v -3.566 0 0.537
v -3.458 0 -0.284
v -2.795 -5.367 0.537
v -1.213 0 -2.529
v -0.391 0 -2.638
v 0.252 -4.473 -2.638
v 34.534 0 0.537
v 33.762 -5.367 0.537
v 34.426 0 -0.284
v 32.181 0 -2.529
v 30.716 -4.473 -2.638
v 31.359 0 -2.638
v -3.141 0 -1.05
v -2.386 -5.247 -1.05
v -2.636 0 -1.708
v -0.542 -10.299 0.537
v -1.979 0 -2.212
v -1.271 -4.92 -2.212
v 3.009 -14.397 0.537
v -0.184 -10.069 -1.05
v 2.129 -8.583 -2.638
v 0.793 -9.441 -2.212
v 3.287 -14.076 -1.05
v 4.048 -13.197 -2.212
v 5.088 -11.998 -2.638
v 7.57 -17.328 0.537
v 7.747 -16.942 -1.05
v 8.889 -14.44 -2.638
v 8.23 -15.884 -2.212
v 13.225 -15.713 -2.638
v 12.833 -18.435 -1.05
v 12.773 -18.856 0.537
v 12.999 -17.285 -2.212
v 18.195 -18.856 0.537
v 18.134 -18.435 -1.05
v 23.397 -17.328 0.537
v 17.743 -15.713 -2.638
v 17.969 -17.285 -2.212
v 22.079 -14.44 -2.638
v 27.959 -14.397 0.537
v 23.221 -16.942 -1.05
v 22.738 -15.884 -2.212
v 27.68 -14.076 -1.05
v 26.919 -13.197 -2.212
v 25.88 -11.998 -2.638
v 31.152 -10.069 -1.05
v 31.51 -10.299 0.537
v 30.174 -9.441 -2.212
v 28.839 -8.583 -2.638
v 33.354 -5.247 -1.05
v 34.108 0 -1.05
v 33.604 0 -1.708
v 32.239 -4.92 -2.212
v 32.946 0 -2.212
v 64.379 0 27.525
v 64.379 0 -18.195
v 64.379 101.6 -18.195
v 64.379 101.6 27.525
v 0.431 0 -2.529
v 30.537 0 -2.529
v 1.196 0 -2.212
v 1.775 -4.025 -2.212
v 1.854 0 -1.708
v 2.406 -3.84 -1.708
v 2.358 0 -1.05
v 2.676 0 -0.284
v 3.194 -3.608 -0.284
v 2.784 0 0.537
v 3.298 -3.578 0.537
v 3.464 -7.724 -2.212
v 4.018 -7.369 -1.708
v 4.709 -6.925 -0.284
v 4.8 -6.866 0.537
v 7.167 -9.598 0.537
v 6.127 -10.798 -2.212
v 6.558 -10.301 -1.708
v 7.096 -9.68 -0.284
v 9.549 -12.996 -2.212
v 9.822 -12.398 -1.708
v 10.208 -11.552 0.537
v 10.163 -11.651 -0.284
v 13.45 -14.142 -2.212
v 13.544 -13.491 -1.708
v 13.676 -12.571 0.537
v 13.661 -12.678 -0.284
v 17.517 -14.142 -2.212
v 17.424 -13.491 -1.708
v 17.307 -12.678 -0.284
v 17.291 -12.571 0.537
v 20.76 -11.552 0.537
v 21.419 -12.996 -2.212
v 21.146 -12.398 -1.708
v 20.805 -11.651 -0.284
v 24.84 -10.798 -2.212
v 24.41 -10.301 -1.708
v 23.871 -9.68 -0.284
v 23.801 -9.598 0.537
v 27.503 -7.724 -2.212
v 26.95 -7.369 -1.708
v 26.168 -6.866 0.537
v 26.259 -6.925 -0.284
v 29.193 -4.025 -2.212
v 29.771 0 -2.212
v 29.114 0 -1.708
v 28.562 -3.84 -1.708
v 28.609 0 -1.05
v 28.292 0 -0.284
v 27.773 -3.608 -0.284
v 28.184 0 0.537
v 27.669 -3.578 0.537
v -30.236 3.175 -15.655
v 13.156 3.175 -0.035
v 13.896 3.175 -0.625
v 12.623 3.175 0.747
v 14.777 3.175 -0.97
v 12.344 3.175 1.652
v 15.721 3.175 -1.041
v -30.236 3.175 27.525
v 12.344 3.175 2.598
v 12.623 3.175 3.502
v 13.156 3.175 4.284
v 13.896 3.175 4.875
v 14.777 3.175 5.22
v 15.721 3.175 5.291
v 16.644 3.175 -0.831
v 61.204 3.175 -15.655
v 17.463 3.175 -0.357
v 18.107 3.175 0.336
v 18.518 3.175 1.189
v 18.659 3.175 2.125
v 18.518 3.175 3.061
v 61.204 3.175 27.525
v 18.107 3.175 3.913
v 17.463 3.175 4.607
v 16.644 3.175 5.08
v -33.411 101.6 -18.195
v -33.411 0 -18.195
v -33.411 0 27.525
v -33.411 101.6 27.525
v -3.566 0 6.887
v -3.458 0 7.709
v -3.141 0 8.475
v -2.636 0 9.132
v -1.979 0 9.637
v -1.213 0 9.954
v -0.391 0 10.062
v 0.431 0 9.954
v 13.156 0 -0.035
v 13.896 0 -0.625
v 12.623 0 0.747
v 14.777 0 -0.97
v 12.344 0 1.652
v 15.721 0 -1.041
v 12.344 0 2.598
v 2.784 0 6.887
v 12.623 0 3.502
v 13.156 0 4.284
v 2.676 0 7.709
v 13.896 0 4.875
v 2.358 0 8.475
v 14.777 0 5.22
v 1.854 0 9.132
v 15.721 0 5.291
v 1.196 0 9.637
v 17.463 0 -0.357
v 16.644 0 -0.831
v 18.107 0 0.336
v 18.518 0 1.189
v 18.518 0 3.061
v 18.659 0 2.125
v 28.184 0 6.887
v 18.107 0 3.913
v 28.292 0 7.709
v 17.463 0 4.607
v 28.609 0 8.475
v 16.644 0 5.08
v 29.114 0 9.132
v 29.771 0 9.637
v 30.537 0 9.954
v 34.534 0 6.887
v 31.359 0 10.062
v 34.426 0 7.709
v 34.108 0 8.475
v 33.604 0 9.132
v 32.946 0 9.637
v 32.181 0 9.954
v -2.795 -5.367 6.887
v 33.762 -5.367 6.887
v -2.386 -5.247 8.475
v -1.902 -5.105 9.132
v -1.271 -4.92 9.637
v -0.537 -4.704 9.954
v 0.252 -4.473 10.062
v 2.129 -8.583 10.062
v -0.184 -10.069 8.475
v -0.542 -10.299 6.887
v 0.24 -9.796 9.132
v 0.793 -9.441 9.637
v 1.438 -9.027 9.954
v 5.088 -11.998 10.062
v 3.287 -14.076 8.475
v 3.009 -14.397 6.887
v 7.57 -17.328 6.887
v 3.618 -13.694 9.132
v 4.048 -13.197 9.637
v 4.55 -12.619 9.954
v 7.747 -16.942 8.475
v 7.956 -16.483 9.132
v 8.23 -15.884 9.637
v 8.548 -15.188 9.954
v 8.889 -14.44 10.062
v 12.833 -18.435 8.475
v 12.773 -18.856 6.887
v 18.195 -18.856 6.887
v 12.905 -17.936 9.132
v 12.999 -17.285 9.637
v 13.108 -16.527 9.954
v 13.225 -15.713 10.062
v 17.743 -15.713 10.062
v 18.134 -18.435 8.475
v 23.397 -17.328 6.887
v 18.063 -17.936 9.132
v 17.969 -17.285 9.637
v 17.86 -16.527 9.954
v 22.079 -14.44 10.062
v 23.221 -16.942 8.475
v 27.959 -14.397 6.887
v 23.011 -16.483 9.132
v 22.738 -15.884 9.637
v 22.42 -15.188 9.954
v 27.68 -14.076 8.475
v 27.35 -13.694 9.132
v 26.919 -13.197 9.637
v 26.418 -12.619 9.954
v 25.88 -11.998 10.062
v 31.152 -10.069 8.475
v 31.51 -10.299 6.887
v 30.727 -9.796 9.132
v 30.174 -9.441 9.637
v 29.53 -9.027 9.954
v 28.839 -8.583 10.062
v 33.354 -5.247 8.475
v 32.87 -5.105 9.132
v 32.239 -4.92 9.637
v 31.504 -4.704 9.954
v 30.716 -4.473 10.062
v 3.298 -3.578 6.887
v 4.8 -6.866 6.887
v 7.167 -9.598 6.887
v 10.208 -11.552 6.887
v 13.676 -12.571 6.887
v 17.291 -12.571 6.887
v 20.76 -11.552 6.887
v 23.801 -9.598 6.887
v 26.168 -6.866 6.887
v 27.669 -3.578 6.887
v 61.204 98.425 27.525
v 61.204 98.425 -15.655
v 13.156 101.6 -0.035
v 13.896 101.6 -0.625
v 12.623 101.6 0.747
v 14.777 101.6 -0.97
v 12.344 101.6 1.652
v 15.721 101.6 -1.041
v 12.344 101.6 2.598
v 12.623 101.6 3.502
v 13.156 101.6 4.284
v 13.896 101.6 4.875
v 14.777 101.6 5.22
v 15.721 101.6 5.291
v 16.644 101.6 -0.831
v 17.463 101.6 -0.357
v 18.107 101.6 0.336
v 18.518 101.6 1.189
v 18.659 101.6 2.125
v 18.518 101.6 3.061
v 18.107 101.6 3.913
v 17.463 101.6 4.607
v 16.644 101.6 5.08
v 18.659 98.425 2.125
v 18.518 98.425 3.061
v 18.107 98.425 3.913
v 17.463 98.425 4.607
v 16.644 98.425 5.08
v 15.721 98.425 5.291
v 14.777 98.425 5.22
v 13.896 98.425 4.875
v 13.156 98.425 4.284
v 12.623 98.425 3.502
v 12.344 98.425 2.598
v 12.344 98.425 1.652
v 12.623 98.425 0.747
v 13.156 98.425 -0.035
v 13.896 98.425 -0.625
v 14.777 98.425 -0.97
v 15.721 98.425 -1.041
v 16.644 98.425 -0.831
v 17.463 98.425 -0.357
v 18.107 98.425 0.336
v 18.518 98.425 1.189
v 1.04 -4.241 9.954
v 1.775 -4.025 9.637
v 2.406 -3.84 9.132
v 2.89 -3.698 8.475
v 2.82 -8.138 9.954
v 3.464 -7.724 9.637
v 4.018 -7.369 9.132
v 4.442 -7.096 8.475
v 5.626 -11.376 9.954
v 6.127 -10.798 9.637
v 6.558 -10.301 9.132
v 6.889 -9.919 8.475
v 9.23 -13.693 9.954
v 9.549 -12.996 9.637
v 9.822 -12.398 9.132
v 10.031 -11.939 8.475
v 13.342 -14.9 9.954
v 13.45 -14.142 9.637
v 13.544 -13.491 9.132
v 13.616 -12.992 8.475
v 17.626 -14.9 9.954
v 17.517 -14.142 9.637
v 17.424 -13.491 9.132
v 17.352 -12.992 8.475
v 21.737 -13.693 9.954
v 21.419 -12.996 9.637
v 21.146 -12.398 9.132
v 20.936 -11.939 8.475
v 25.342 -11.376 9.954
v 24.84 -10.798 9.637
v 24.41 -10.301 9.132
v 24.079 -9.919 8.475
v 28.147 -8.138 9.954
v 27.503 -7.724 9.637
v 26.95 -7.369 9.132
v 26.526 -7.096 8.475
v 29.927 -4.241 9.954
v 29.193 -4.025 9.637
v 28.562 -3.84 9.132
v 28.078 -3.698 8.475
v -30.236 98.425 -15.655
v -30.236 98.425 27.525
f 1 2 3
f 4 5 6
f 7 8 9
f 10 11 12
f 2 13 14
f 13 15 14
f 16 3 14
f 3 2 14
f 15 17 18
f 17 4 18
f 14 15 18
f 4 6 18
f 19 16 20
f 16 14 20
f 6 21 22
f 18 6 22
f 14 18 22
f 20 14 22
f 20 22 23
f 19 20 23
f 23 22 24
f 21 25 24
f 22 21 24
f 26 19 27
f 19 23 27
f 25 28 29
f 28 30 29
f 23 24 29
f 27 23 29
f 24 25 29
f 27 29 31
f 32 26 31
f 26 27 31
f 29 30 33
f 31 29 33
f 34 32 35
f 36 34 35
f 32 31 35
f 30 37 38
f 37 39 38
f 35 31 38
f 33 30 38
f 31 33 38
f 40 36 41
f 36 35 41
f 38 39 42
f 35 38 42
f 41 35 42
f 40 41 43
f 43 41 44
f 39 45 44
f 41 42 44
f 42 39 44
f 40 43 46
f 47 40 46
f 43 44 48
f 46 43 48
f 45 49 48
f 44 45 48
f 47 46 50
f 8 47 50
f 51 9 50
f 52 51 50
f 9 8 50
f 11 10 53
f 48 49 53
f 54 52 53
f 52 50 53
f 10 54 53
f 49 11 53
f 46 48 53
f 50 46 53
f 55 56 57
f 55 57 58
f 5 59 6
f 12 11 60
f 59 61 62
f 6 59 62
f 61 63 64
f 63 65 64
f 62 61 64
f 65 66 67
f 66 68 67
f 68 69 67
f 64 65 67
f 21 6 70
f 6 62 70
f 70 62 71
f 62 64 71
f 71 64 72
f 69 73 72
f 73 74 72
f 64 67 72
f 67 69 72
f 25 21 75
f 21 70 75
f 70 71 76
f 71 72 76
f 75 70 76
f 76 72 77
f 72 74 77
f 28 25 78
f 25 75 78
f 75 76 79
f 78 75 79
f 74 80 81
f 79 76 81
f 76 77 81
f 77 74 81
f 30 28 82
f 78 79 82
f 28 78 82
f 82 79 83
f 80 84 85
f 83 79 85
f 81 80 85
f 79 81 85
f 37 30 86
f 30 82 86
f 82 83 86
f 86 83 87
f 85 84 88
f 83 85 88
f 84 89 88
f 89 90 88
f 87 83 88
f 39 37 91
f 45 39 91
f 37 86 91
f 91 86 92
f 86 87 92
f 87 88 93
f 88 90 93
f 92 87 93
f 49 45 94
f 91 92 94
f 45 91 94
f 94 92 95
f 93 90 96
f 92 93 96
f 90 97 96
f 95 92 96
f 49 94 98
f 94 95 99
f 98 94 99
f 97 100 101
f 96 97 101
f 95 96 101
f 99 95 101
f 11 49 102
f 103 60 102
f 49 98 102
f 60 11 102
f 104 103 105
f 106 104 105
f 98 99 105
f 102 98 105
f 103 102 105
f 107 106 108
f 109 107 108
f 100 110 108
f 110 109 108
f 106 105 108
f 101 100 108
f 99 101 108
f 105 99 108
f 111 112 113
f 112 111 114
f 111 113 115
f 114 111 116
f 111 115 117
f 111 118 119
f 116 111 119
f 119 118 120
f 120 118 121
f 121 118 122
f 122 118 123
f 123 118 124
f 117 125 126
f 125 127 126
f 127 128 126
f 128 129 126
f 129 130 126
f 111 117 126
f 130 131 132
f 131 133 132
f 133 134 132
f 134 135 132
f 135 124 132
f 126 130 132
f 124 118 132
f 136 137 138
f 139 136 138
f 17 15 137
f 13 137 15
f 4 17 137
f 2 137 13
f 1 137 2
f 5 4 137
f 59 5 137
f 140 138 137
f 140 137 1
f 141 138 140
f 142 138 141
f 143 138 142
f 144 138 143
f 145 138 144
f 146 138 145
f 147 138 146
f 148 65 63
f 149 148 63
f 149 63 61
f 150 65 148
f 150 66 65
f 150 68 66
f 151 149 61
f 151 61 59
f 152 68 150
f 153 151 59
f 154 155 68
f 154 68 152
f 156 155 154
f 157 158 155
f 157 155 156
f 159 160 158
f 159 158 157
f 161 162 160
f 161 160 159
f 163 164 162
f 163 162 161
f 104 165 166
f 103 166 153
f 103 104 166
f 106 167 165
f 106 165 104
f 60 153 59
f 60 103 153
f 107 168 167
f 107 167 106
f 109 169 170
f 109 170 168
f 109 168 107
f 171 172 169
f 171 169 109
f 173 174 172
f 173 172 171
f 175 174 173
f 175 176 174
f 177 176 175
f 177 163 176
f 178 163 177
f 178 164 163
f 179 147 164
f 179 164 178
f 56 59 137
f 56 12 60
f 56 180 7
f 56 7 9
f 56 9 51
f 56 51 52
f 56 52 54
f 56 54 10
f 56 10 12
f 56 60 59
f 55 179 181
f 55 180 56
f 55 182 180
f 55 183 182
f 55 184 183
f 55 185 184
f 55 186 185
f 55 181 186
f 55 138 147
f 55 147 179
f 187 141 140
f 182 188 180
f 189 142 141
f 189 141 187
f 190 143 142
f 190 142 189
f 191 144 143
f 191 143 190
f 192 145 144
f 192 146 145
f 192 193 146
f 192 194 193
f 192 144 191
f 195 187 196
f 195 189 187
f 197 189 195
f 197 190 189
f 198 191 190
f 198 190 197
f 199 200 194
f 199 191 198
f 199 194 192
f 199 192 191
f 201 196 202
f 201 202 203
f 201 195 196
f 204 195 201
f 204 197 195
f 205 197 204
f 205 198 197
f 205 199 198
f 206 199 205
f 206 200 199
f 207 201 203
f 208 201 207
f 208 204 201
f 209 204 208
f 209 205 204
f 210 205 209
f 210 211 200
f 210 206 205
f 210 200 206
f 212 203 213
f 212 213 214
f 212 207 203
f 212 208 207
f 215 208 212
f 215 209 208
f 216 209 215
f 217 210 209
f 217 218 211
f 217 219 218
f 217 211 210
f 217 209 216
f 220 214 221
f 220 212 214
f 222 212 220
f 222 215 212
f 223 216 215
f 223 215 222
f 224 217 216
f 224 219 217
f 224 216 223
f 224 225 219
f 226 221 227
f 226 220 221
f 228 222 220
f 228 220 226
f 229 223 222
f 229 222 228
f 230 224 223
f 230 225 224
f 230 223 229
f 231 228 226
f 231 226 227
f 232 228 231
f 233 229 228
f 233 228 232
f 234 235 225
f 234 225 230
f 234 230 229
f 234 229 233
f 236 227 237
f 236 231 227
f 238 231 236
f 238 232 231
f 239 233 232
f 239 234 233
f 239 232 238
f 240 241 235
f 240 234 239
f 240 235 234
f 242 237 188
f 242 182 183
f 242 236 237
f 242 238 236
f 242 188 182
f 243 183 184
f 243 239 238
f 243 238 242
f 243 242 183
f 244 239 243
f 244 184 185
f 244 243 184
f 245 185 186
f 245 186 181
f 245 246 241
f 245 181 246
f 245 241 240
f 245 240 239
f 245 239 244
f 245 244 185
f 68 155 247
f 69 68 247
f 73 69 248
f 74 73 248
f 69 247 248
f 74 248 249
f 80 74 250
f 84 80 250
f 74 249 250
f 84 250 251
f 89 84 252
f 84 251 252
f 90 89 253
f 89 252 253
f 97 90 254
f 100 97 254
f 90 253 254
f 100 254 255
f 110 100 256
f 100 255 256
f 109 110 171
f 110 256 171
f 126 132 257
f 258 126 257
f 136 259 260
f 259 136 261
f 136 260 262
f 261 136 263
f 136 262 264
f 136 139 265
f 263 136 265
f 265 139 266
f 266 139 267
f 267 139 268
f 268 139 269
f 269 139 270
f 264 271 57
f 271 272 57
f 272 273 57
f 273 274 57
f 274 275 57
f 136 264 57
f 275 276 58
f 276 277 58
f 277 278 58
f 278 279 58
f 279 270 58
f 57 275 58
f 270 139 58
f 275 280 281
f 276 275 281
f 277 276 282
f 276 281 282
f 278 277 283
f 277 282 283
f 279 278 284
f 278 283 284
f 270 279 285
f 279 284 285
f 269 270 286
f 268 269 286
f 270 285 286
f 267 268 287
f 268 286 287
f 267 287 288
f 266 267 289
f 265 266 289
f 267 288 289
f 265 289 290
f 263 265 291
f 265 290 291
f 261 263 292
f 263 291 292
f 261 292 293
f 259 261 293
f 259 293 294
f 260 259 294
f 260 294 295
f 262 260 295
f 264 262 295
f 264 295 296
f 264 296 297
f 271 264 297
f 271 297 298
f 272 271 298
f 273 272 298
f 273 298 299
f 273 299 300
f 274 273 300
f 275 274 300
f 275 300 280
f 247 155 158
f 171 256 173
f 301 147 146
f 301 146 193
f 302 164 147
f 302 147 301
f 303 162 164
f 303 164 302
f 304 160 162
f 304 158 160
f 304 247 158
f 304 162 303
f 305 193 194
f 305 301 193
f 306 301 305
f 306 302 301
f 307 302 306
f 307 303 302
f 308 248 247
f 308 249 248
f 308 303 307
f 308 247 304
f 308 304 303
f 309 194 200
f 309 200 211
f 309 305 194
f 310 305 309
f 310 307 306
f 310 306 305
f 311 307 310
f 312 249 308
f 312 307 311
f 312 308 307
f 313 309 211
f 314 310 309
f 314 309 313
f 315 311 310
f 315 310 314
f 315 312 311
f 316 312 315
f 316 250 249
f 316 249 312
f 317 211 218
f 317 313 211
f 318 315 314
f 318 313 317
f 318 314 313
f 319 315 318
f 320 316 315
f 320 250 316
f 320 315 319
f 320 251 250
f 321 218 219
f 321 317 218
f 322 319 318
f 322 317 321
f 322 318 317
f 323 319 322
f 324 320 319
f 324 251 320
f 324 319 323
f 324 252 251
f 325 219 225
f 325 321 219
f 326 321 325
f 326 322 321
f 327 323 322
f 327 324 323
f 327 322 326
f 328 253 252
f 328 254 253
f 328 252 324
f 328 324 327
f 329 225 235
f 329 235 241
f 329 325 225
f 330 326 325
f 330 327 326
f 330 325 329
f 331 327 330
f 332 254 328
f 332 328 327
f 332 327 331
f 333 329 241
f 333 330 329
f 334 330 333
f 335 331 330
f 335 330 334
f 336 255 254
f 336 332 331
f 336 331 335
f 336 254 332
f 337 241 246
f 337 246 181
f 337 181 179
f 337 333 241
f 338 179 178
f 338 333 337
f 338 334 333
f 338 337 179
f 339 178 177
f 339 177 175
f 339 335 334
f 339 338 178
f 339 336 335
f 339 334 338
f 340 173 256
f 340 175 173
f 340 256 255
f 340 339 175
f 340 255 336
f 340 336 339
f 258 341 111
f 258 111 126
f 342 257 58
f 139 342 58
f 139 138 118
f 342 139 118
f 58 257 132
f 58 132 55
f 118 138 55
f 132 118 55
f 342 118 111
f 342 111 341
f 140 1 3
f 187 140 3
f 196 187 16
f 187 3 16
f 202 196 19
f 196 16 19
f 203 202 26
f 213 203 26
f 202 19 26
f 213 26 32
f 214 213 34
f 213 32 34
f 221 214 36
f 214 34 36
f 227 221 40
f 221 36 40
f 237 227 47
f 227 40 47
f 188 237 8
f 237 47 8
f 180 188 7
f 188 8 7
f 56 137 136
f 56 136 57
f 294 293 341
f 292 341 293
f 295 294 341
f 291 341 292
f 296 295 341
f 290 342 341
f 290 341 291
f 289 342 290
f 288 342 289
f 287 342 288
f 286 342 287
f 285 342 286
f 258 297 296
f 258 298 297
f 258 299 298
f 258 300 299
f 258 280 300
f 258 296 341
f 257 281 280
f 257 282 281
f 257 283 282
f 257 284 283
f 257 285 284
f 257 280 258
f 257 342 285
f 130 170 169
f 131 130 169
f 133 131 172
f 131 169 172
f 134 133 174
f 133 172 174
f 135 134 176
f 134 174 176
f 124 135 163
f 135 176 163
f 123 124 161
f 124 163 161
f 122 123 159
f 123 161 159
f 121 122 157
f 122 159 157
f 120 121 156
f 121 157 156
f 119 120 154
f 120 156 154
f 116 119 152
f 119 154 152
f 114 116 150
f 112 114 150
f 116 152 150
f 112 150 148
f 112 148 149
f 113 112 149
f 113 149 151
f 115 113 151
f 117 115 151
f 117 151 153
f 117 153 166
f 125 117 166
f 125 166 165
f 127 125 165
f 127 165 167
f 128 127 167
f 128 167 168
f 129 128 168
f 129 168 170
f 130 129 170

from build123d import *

# Parameters (mm, degrees)
F0_W      = 97.79
F0_H      = 45.72
F1_DEPTH  = 101.6
F2_W      = 91.44
F2_H      = 95.25
F3_DEPTH  = 43.18
F4_W      = 19.05
F4_H      = 6.35
F5_ANGLE  = 180
F7_DEPTH  = 25.4
F8_R      = 3.17499
F10_D     = 6.35
F10_DEPTH = 101.601


# Not quite as in the source:
# - a fillet or chamfer is up to 0.001 mm smaller than in the source, because OpenCascade refuses the exact size


with BuildPart() as f1:
    # F0 (on Front) → F1 (new body)
    with BuildSketch(Plane.XZ):
        with Locations((15.4838143581, 4.6649015626)):
            Rectangle(F0_W, F0_H)
    extrude(amount=-F1_DEPTH)

    # F2 (on face) → F3 (cut)
    with BuildSketch(Plane.XY.offset(27.5249015626)):
        with Locations((15.4838143581, 50.8)):
            Rectangle(F2_W, F2_H)
    extrude(amount=-F3_DEPTH, mode=Mode.SUBTRACT)

    # F4 (on face) → F5 (revolve)
    with BuildSketch(Plane.XZ):
        with Locations((5.9588143581, 6.8874015626)):
            Rectangle(F4_W, F4_H)
        with Locations((5.9588143581, 0.5374015626)):
            Rectangle(F4_W, F4_H)
    revolve(axis=Axis((15.4838143581, 0, 3.7124015626), (0, 0, 1)), revolution_arc=F5_ANGLE)

    # F6 (on face) → F7 (cut)
    with BuildSketch(Plane.XY.offset(10.0624015626)):
        with BuildLine():
            Line((28.1838143581, 0), (2.7838143581, 0))
            ThreePointArc((2.7838143581, 0), (15.4838143581, -12.7), (28.1838143581, 0))
        make_face()
    extrude(amount=-F7_DEPTH, mode=Mode.SUBTRACT)

    # F8 (radius 3.175 in the source; OpenCascade refuses exactly that, so slightly less here)
    f8_edges = [f1.edges().sort_by_distance(p)[0] for p in [
        (15.483814, -19.05, 10.062402),
        (15.483814, -12.7, 10.062402),
        (15.483814, -19.05, -2.637598),
        (15.483814, -12.7, -2.637598),
    ]]
    fillet(f8_edges, radius=F8_R)

    # F10 (through all, one way)
    with BuildSketch(Plane.XZ):
        with Locations((15.4838143581, 2.1249015626)):
            Circle(F10_D / 2)
    extrude(amount=-F10_DEPTH, mode=Mode.SUBTRACT)


solid = f1.part
